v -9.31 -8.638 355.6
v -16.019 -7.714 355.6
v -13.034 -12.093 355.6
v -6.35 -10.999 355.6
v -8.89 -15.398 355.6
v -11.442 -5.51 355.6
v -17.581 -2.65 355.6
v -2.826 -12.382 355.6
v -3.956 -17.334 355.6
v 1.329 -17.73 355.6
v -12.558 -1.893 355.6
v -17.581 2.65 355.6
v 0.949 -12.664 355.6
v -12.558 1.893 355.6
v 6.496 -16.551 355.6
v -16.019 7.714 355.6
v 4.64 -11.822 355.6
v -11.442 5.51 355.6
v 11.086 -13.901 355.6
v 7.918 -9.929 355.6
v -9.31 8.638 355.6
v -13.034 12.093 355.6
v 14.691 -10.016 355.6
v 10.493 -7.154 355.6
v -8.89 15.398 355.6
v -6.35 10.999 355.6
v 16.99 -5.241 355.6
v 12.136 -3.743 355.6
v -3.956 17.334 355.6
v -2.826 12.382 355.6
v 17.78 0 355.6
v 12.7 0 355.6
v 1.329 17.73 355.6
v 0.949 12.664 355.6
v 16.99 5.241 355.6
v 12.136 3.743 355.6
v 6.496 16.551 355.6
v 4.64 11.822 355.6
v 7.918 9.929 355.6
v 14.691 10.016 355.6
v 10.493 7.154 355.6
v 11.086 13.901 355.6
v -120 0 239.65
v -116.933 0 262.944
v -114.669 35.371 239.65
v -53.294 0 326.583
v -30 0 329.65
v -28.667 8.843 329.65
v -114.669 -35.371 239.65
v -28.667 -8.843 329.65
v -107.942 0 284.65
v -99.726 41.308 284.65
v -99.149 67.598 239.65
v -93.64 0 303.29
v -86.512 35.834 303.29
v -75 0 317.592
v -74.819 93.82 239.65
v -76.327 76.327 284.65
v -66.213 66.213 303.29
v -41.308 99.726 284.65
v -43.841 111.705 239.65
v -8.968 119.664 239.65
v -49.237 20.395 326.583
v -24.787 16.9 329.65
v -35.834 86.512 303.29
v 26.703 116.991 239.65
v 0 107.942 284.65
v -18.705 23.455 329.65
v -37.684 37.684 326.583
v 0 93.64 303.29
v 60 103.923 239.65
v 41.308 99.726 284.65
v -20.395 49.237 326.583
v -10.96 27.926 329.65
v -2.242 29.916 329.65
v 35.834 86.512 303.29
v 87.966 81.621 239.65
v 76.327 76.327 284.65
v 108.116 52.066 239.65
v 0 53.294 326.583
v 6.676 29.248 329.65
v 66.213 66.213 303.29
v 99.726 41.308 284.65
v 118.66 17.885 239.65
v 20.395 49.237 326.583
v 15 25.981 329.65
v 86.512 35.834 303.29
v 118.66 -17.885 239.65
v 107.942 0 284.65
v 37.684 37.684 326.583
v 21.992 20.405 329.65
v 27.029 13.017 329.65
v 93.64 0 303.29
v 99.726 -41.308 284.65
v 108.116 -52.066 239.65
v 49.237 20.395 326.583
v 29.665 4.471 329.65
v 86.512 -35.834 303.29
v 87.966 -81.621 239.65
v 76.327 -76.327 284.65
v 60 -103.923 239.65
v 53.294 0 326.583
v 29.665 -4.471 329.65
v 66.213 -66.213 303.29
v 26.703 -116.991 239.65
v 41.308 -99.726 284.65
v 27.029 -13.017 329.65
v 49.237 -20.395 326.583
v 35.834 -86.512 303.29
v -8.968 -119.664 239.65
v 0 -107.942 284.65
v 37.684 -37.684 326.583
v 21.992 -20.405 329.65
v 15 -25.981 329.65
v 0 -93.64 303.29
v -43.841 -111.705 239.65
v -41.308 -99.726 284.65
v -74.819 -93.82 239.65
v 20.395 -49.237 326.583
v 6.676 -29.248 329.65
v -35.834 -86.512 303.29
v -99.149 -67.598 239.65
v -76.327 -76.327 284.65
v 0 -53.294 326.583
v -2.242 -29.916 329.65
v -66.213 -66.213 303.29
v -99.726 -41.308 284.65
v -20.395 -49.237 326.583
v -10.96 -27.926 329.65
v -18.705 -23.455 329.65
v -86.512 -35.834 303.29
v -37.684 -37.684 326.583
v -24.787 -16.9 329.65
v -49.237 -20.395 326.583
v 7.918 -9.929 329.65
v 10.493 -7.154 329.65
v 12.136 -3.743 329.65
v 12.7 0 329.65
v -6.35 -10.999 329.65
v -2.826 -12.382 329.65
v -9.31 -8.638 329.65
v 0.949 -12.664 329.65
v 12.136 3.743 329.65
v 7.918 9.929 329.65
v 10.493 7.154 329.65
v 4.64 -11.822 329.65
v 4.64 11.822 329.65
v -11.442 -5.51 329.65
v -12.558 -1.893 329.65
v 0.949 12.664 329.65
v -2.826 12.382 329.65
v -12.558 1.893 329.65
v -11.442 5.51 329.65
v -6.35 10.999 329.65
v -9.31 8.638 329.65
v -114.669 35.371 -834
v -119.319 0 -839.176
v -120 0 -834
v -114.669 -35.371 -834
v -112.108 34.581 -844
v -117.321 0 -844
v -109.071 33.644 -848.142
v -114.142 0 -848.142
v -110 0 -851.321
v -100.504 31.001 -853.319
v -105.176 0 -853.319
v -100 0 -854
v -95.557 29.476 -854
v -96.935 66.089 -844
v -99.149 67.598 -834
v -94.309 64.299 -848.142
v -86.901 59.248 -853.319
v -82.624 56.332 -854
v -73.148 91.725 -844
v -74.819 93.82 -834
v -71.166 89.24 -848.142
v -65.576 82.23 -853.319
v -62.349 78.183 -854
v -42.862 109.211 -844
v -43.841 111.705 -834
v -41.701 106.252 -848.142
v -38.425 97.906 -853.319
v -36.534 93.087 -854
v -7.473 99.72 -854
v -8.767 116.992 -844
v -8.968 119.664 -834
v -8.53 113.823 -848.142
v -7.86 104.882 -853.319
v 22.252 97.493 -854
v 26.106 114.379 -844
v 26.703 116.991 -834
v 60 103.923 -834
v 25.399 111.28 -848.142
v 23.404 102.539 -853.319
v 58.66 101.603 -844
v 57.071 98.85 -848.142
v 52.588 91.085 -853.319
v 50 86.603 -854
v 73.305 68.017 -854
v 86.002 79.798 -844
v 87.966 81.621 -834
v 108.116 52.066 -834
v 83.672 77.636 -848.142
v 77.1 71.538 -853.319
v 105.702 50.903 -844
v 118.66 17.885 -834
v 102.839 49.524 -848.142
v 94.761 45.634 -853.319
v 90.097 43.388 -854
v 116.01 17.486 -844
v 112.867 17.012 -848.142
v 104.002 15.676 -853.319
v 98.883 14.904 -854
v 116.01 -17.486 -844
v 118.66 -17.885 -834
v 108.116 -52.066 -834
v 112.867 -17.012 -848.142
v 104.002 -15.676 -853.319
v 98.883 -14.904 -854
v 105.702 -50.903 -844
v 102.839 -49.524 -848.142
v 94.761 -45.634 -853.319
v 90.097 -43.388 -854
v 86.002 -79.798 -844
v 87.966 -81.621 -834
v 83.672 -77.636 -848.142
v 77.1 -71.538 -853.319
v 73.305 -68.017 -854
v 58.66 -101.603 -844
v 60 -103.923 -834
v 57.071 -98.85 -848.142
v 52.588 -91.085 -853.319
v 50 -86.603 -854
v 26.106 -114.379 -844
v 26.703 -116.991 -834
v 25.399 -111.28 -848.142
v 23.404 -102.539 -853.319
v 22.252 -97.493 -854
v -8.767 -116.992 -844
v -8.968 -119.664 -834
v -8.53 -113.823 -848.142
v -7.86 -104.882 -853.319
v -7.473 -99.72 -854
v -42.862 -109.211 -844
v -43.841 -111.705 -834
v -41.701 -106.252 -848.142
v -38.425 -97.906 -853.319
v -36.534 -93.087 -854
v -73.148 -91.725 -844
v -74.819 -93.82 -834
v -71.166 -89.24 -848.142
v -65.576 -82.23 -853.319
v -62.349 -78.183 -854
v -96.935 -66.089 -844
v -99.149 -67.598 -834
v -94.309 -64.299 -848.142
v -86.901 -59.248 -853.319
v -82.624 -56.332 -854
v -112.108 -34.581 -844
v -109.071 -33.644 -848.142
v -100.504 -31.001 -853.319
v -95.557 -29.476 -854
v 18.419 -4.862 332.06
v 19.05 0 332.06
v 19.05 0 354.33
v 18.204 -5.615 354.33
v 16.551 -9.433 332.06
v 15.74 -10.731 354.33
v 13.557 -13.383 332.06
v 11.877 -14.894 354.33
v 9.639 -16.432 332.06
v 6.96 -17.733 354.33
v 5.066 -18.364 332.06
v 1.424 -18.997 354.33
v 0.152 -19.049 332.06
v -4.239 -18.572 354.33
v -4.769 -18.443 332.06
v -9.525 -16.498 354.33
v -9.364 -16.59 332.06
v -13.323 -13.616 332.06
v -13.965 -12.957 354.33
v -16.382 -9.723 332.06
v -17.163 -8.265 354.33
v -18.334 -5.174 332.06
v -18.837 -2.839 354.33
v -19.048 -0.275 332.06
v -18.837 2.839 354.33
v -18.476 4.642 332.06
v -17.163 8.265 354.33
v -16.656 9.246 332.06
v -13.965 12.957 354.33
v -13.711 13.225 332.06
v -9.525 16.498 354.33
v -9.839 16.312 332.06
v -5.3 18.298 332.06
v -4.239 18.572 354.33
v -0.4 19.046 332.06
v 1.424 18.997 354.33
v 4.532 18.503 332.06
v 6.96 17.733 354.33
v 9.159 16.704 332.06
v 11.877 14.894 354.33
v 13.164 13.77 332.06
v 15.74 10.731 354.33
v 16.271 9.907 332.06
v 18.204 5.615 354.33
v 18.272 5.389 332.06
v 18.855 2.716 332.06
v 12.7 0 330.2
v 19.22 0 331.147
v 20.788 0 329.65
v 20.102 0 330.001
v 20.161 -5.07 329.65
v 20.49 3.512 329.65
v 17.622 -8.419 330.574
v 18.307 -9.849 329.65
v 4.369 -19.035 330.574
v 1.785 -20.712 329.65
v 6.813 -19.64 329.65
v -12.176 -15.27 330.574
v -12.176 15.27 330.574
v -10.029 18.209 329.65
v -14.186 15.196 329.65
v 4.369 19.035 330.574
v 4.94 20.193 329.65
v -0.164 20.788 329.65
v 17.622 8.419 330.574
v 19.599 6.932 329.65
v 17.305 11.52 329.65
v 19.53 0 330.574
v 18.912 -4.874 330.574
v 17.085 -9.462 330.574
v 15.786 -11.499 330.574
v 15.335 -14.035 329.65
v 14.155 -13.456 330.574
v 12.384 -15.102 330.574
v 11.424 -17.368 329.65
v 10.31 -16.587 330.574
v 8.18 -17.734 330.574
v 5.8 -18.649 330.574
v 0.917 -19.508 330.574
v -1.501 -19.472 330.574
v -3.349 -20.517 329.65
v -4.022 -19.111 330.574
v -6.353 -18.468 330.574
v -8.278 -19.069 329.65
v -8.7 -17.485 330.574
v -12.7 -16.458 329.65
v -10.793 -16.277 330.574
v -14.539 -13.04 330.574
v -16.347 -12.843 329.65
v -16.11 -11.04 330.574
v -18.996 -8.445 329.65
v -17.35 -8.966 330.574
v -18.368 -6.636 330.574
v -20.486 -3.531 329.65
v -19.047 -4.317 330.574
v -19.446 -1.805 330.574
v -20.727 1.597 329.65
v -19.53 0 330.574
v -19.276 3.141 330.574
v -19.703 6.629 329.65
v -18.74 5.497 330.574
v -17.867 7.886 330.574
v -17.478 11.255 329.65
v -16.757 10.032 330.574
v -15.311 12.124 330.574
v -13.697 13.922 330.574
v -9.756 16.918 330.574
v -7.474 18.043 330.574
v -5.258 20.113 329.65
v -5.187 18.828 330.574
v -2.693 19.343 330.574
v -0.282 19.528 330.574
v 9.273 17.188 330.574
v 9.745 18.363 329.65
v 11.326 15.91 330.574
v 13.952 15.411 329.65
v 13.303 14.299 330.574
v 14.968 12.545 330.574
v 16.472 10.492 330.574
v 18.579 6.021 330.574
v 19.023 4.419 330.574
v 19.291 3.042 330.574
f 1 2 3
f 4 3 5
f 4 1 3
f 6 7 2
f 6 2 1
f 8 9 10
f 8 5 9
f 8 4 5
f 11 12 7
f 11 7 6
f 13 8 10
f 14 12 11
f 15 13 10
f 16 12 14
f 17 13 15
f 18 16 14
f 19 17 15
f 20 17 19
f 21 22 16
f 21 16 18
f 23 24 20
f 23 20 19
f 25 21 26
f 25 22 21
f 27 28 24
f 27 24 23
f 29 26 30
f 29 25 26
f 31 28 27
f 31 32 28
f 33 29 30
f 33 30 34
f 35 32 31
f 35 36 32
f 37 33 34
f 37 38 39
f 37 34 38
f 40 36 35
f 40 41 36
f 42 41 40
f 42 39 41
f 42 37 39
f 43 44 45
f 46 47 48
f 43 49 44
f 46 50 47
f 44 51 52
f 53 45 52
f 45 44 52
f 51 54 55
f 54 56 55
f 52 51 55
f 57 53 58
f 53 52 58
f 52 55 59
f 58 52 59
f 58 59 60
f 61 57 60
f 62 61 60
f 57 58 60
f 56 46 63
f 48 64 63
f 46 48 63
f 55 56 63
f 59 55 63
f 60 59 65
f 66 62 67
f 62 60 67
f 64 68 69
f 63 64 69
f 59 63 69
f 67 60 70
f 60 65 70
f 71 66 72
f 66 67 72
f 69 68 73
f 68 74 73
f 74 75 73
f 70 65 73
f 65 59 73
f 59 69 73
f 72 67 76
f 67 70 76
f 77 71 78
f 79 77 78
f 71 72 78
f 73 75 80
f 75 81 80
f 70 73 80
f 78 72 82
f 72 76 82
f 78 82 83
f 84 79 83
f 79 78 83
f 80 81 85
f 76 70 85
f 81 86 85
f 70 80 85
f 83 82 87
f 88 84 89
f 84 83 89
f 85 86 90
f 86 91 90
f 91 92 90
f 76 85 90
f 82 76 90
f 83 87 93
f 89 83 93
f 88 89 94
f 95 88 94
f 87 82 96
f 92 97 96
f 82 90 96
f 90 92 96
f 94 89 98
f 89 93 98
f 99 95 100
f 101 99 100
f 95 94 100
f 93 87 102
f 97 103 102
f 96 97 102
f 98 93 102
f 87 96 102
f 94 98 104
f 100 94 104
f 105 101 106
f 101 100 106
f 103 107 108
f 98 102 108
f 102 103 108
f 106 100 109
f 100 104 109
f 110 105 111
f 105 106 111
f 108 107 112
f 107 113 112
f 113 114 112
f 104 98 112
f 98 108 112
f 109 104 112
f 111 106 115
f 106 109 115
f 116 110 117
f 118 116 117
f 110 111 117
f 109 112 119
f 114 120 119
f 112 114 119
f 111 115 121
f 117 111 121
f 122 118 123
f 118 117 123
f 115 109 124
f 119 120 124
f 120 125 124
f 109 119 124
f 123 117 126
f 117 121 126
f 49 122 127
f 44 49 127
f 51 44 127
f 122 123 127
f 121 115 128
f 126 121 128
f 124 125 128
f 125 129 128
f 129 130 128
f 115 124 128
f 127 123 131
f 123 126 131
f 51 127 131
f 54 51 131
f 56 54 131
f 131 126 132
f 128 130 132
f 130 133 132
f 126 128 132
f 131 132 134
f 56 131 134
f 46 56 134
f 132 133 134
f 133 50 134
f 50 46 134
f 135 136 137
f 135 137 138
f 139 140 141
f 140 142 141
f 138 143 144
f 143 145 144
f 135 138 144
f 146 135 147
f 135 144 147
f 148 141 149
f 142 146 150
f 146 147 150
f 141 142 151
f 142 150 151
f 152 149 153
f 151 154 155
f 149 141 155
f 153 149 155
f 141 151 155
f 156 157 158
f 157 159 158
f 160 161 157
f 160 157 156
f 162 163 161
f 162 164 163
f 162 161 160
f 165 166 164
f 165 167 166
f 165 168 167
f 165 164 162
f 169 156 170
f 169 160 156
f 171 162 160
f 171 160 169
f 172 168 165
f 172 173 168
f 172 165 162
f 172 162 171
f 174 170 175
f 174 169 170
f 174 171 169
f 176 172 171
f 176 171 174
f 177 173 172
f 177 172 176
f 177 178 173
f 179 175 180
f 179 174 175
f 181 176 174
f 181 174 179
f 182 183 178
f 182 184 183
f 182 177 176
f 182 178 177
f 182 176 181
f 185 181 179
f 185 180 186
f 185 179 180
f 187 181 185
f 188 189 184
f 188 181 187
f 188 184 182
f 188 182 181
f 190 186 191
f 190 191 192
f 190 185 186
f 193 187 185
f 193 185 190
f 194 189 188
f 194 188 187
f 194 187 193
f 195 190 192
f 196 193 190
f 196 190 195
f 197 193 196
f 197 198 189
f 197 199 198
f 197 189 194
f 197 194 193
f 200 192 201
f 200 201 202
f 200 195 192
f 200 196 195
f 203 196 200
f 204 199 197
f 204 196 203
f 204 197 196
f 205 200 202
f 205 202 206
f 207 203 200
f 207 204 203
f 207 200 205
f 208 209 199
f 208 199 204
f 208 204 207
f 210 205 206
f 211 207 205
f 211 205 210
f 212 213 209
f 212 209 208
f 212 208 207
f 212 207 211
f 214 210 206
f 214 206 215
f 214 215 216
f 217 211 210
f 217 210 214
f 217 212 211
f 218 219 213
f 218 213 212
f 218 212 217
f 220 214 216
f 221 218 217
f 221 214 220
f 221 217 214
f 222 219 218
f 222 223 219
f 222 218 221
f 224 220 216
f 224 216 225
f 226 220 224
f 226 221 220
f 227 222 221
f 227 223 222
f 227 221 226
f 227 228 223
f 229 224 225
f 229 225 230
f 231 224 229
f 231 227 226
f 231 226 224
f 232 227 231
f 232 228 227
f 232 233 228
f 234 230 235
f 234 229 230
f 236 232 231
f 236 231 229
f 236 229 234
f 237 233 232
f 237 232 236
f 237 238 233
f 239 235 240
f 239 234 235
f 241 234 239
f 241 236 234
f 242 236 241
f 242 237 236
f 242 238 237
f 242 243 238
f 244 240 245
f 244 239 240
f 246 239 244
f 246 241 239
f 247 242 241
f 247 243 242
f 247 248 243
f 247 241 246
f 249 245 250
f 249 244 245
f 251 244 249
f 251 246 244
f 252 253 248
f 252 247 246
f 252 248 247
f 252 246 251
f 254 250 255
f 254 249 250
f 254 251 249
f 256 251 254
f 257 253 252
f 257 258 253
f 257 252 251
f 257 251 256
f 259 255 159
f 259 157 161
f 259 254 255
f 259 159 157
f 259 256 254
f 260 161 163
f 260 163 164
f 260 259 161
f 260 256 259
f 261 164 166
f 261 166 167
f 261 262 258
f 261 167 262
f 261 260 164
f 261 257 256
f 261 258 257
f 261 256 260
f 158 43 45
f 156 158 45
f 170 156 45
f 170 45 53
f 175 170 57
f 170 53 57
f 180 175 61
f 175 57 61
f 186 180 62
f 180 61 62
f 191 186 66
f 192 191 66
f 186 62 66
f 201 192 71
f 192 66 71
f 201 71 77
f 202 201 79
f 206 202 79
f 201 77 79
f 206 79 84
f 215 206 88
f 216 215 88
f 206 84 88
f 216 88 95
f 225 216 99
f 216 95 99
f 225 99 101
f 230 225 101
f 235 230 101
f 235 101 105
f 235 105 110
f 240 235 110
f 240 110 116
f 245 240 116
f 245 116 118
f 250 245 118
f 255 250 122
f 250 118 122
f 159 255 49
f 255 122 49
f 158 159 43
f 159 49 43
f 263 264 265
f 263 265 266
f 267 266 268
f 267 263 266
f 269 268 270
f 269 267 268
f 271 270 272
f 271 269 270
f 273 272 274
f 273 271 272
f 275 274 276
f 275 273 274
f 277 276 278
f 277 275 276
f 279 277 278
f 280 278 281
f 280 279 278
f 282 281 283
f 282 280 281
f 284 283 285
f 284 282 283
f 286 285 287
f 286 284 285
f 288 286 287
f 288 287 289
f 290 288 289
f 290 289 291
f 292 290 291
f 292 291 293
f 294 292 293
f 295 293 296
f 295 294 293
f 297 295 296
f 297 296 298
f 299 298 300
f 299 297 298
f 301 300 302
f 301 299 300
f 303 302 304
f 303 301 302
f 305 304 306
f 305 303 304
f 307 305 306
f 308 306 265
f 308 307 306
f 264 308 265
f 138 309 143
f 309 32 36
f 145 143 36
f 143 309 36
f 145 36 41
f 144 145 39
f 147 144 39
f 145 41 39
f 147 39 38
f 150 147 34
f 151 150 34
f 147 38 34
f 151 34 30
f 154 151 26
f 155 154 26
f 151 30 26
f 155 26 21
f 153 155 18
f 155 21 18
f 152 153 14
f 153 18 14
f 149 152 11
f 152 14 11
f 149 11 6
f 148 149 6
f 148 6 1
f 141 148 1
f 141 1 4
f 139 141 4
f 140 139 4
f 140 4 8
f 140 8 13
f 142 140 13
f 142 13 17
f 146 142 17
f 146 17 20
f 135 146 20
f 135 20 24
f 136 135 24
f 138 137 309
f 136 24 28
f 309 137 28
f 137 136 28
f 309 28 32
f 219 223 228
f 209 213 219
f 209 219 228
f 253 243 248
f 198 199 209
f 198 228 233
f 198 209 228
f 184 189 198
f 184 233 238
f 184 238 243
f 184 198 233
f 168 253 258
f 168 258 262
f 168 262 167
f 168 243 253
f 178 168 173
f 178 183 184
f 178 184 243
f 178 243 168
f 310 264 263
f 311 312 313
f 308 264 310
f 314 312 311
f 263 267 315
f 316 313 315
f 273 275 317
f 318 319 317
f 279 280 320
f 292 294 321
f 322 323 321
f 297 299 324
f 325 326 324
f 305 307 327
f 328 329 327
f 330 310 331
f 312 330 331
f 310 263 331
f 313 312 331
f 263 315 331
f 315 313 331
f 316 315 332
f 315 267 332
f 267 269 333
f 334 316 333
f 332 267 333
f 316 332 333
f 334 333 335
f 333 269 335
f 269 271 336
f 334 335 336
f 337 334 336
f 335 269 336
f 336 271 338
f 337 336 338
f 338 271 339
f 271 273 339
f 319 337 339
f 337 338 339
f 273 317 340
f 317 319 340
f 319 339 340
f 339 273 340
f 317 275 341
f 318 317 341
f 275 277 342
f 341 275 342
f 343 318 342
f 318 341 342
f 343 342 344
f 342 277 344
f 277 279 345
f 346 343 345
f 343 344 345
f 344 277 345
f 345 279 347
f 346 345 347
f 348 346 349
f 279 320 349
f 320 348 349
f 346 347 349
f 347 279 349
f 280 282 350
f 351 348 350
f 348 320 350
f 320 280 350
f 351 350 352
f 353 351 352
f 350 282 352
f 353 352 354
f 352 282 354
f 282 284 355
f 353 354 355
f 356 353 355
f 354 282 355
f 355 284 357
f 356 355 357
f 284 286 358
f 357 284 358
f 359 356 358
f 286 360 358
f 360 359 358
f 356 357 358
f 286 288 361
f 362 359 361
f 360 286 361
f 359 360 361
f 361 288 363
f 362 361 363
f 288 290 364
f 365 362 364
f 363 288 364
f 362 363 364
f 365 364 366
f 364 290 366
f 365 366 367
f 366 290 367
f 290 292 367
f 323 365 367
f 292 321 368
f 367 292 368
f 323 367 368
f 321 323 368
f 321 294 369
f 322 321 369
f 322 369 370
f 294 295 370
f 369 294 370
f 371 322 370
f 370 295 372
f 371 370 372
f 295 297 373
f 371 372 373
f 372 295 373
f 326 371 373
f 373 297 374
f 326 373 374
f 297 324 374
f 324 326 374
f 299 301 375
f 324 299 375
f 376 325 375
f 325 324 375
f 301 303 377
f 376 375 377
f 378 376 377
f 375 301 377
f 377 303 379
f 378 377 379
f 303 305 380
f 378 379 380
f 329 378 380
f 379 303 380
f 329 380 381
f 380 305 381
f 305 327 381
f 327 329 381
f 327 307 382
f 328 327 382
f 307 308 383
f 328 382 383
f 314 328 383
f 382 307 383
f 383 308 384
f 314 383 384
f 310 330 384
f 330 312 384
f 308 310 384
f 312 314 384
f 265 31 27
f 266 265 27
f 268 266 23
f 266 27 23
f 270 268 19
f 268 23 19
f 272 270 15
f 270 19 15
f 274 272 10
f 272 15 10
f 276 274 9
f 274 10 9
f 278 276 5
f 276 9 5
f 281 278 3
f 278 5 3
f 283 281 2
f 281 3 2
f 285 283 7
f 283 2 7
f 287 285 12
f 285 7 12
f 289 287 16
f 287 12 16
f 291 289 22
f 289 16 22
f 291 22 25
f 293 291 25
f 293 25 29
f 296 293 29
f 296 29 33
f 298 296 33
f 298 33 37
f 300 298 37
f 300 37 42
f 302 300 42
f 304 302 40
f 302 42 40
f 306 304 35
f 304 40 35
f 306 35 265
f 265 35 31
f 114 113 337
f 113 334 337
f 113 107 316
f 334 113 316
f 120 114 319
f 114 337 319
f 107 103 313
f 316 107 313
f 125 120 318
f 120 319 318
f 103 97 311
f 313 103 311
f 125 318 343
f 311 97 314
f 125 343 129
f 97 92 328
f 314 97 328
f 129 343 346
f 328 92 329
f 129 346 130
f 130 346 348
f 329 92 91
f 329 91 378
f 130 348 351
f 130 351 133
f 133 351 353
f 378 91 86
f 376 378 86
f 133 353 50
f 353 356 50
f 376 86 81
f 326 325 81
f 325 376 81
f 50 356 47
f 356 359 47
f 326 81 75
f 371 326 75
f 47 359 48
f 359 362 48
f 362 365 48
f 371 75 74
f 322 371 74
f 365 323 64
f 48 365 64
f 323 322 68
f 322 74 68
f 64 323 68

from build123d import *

# Parameters (mm, degrees)
BOSS_EXTRUDE1_DEPTH      = 355.6
BOSS_EXTRUDE1_DEPTH_BACK = 254
SKETCH1_R                = 66.04
FILLET1_R                = 12.7
SKETCH3_R                = 12.7
CUT_EXTRUDE1_DEPTH       = 25.4
CHAMFER1_SIZE            = 1.27
FILLET2_R                = 2.54
BOSS_EXTRUDE2_DEPTH      = 600
BOSS_EXTRUDE2_DEPTH_BACK = 583.65
SKETCH4_R                = 120
FILLET3_R                = 20
FILLET4_R                = 90


# Read off the part's stored shape, not the designer's step: Shell1
with BuildPart() as part:
    # Sketch1 → Boss-Extrude1 (new, two sides: drawn at the far end of the back side and taken through both)
    with BuildSketch(Plane.XY.offset(-BOSS_EXTRUDE1_DEPTH_BACK)):
        Circle(SKETCH1_R)
    extrude(amount=BOSS_EXTRUDE1_DEPTH + BOSS_EXTRUDE1_DEPTH_BACK)

    # Sketch2 → Cut-Revolve1 (revolve, cut)
    with BuildSketch(Plane(origin=(0, 0, 0), x_dir=(0, 0, -1), z_dir=(1, 0, 0)), mode=Mode.PRIVATE) as cut_revolve1_sk:
        with BuildLine():
            Line((-355.6, 19.05), (-330.2, 19.05))
            ThreePointArc((-330.2, 19.05), (-306.35774098, 53.006337357), (-266.967262435, 66.04))
            Line((-266.967262435, 66.04), (-355.6, 66.04))
            Line((-355.6, 66.04), (-355.6, 19.05))
        make_face()
    revolve(cut_revolve1_sk.sketch.rotate(Axis((0, 0, 355.6), (0, 0, -1)), 90), axis=Axis((0, 0, 355.6), (0, 0, -1)), mode=Mode.SUBTRACT)

    # Fillet1
    fillet1_edges = [part.edges().sort_by_distance(p)[0] for p in [
        (-66.04, 0, -254),
    ]]
    fillet(fillet1_edges, radius=FILLET1_R)

    # Sketch3 → Cut-Extrude1 (cut)
    with BuildSketch(Plane.XY.offset(355.6)):
        Circle(SKETCH3_R)
    extrude(amount=-CUT_EXTRUDE1_DEPTH, mode=Mode.SUBTRACT)

    # Shell1 outline → Shell1 (revolve, cut)
    with BuildSketch(Plane.XZ):
        with BuildLine():
            Line((0, -247.65), (53.34, -247.65))
            ThreePointArc((53.34, -247.65), (57.830128061, -245.790128061), (59.69, -241.3))
            Line((59.69, -241.3), (59.69, 266.967262375))
            ThreePointArc((59.69, 266.967262375), (46.480959005, 304.416114887), (12.699999942, 325.290551964))
            Line((12.699999942, 325.290551964), (12.7, 330.2))
            Line((12.7, 330.2), (0, 330.2))
            Line((0, 330.2), (0, -247.65))
        make_face()
    revolve(axis=Axis((0, 0, 0), (0, 0, 1)), mode=Mode.SUBTRACT)

    # Chamfer1
    chamfer1_edges = [part.edges().sort_by_distance(p)[0] for p in [
        (-19.05, 0, 355.6),
    ]]
    chamfer(chamfer1_edges, length=CHAMFER1_SIZE)

    # Fillet2
    fillet2_edges = [part.edges().sort_by_distance(p)[0] for p in [
        (-19.05, 0, 330.2),
    ]]
    fillet(fillet2_edges, radius=FILLET2_R)

    # Sketch4 → Boss-Extrude2 (add, two sides: drawn at the far end of the back side and taken through both)
    with BuildSketch(Plane(origin=(0, 0, -254), x_dir=(-1, 0, 0), z_dir=(0, 0, -1)).offset(-BOSS_EXTRUDE2_DEPTH_BACK)):
        Circle(SKETCH4_R)
    extrude(amount=BOSS_EXTRUDE2_DEPTH + BOSS_EXTRUDE2_DEPTH_BACK)

    # Fillet3
    fillet3_edges = [part.edges().sort_by_distance(p)[0] for p in [
        (120, 0, -854),
    ]]
    fillet(fillet3_edges, radius=FILLET3_R)

    # Fillet4
    fillet4_edges = [part.edges().sort_by_distance(p)[0] for p in [
        (120, 0, 329.65),
    ]]
    fillet(fillet4_edges, radius=FILLET4_R)


solid = part.part
